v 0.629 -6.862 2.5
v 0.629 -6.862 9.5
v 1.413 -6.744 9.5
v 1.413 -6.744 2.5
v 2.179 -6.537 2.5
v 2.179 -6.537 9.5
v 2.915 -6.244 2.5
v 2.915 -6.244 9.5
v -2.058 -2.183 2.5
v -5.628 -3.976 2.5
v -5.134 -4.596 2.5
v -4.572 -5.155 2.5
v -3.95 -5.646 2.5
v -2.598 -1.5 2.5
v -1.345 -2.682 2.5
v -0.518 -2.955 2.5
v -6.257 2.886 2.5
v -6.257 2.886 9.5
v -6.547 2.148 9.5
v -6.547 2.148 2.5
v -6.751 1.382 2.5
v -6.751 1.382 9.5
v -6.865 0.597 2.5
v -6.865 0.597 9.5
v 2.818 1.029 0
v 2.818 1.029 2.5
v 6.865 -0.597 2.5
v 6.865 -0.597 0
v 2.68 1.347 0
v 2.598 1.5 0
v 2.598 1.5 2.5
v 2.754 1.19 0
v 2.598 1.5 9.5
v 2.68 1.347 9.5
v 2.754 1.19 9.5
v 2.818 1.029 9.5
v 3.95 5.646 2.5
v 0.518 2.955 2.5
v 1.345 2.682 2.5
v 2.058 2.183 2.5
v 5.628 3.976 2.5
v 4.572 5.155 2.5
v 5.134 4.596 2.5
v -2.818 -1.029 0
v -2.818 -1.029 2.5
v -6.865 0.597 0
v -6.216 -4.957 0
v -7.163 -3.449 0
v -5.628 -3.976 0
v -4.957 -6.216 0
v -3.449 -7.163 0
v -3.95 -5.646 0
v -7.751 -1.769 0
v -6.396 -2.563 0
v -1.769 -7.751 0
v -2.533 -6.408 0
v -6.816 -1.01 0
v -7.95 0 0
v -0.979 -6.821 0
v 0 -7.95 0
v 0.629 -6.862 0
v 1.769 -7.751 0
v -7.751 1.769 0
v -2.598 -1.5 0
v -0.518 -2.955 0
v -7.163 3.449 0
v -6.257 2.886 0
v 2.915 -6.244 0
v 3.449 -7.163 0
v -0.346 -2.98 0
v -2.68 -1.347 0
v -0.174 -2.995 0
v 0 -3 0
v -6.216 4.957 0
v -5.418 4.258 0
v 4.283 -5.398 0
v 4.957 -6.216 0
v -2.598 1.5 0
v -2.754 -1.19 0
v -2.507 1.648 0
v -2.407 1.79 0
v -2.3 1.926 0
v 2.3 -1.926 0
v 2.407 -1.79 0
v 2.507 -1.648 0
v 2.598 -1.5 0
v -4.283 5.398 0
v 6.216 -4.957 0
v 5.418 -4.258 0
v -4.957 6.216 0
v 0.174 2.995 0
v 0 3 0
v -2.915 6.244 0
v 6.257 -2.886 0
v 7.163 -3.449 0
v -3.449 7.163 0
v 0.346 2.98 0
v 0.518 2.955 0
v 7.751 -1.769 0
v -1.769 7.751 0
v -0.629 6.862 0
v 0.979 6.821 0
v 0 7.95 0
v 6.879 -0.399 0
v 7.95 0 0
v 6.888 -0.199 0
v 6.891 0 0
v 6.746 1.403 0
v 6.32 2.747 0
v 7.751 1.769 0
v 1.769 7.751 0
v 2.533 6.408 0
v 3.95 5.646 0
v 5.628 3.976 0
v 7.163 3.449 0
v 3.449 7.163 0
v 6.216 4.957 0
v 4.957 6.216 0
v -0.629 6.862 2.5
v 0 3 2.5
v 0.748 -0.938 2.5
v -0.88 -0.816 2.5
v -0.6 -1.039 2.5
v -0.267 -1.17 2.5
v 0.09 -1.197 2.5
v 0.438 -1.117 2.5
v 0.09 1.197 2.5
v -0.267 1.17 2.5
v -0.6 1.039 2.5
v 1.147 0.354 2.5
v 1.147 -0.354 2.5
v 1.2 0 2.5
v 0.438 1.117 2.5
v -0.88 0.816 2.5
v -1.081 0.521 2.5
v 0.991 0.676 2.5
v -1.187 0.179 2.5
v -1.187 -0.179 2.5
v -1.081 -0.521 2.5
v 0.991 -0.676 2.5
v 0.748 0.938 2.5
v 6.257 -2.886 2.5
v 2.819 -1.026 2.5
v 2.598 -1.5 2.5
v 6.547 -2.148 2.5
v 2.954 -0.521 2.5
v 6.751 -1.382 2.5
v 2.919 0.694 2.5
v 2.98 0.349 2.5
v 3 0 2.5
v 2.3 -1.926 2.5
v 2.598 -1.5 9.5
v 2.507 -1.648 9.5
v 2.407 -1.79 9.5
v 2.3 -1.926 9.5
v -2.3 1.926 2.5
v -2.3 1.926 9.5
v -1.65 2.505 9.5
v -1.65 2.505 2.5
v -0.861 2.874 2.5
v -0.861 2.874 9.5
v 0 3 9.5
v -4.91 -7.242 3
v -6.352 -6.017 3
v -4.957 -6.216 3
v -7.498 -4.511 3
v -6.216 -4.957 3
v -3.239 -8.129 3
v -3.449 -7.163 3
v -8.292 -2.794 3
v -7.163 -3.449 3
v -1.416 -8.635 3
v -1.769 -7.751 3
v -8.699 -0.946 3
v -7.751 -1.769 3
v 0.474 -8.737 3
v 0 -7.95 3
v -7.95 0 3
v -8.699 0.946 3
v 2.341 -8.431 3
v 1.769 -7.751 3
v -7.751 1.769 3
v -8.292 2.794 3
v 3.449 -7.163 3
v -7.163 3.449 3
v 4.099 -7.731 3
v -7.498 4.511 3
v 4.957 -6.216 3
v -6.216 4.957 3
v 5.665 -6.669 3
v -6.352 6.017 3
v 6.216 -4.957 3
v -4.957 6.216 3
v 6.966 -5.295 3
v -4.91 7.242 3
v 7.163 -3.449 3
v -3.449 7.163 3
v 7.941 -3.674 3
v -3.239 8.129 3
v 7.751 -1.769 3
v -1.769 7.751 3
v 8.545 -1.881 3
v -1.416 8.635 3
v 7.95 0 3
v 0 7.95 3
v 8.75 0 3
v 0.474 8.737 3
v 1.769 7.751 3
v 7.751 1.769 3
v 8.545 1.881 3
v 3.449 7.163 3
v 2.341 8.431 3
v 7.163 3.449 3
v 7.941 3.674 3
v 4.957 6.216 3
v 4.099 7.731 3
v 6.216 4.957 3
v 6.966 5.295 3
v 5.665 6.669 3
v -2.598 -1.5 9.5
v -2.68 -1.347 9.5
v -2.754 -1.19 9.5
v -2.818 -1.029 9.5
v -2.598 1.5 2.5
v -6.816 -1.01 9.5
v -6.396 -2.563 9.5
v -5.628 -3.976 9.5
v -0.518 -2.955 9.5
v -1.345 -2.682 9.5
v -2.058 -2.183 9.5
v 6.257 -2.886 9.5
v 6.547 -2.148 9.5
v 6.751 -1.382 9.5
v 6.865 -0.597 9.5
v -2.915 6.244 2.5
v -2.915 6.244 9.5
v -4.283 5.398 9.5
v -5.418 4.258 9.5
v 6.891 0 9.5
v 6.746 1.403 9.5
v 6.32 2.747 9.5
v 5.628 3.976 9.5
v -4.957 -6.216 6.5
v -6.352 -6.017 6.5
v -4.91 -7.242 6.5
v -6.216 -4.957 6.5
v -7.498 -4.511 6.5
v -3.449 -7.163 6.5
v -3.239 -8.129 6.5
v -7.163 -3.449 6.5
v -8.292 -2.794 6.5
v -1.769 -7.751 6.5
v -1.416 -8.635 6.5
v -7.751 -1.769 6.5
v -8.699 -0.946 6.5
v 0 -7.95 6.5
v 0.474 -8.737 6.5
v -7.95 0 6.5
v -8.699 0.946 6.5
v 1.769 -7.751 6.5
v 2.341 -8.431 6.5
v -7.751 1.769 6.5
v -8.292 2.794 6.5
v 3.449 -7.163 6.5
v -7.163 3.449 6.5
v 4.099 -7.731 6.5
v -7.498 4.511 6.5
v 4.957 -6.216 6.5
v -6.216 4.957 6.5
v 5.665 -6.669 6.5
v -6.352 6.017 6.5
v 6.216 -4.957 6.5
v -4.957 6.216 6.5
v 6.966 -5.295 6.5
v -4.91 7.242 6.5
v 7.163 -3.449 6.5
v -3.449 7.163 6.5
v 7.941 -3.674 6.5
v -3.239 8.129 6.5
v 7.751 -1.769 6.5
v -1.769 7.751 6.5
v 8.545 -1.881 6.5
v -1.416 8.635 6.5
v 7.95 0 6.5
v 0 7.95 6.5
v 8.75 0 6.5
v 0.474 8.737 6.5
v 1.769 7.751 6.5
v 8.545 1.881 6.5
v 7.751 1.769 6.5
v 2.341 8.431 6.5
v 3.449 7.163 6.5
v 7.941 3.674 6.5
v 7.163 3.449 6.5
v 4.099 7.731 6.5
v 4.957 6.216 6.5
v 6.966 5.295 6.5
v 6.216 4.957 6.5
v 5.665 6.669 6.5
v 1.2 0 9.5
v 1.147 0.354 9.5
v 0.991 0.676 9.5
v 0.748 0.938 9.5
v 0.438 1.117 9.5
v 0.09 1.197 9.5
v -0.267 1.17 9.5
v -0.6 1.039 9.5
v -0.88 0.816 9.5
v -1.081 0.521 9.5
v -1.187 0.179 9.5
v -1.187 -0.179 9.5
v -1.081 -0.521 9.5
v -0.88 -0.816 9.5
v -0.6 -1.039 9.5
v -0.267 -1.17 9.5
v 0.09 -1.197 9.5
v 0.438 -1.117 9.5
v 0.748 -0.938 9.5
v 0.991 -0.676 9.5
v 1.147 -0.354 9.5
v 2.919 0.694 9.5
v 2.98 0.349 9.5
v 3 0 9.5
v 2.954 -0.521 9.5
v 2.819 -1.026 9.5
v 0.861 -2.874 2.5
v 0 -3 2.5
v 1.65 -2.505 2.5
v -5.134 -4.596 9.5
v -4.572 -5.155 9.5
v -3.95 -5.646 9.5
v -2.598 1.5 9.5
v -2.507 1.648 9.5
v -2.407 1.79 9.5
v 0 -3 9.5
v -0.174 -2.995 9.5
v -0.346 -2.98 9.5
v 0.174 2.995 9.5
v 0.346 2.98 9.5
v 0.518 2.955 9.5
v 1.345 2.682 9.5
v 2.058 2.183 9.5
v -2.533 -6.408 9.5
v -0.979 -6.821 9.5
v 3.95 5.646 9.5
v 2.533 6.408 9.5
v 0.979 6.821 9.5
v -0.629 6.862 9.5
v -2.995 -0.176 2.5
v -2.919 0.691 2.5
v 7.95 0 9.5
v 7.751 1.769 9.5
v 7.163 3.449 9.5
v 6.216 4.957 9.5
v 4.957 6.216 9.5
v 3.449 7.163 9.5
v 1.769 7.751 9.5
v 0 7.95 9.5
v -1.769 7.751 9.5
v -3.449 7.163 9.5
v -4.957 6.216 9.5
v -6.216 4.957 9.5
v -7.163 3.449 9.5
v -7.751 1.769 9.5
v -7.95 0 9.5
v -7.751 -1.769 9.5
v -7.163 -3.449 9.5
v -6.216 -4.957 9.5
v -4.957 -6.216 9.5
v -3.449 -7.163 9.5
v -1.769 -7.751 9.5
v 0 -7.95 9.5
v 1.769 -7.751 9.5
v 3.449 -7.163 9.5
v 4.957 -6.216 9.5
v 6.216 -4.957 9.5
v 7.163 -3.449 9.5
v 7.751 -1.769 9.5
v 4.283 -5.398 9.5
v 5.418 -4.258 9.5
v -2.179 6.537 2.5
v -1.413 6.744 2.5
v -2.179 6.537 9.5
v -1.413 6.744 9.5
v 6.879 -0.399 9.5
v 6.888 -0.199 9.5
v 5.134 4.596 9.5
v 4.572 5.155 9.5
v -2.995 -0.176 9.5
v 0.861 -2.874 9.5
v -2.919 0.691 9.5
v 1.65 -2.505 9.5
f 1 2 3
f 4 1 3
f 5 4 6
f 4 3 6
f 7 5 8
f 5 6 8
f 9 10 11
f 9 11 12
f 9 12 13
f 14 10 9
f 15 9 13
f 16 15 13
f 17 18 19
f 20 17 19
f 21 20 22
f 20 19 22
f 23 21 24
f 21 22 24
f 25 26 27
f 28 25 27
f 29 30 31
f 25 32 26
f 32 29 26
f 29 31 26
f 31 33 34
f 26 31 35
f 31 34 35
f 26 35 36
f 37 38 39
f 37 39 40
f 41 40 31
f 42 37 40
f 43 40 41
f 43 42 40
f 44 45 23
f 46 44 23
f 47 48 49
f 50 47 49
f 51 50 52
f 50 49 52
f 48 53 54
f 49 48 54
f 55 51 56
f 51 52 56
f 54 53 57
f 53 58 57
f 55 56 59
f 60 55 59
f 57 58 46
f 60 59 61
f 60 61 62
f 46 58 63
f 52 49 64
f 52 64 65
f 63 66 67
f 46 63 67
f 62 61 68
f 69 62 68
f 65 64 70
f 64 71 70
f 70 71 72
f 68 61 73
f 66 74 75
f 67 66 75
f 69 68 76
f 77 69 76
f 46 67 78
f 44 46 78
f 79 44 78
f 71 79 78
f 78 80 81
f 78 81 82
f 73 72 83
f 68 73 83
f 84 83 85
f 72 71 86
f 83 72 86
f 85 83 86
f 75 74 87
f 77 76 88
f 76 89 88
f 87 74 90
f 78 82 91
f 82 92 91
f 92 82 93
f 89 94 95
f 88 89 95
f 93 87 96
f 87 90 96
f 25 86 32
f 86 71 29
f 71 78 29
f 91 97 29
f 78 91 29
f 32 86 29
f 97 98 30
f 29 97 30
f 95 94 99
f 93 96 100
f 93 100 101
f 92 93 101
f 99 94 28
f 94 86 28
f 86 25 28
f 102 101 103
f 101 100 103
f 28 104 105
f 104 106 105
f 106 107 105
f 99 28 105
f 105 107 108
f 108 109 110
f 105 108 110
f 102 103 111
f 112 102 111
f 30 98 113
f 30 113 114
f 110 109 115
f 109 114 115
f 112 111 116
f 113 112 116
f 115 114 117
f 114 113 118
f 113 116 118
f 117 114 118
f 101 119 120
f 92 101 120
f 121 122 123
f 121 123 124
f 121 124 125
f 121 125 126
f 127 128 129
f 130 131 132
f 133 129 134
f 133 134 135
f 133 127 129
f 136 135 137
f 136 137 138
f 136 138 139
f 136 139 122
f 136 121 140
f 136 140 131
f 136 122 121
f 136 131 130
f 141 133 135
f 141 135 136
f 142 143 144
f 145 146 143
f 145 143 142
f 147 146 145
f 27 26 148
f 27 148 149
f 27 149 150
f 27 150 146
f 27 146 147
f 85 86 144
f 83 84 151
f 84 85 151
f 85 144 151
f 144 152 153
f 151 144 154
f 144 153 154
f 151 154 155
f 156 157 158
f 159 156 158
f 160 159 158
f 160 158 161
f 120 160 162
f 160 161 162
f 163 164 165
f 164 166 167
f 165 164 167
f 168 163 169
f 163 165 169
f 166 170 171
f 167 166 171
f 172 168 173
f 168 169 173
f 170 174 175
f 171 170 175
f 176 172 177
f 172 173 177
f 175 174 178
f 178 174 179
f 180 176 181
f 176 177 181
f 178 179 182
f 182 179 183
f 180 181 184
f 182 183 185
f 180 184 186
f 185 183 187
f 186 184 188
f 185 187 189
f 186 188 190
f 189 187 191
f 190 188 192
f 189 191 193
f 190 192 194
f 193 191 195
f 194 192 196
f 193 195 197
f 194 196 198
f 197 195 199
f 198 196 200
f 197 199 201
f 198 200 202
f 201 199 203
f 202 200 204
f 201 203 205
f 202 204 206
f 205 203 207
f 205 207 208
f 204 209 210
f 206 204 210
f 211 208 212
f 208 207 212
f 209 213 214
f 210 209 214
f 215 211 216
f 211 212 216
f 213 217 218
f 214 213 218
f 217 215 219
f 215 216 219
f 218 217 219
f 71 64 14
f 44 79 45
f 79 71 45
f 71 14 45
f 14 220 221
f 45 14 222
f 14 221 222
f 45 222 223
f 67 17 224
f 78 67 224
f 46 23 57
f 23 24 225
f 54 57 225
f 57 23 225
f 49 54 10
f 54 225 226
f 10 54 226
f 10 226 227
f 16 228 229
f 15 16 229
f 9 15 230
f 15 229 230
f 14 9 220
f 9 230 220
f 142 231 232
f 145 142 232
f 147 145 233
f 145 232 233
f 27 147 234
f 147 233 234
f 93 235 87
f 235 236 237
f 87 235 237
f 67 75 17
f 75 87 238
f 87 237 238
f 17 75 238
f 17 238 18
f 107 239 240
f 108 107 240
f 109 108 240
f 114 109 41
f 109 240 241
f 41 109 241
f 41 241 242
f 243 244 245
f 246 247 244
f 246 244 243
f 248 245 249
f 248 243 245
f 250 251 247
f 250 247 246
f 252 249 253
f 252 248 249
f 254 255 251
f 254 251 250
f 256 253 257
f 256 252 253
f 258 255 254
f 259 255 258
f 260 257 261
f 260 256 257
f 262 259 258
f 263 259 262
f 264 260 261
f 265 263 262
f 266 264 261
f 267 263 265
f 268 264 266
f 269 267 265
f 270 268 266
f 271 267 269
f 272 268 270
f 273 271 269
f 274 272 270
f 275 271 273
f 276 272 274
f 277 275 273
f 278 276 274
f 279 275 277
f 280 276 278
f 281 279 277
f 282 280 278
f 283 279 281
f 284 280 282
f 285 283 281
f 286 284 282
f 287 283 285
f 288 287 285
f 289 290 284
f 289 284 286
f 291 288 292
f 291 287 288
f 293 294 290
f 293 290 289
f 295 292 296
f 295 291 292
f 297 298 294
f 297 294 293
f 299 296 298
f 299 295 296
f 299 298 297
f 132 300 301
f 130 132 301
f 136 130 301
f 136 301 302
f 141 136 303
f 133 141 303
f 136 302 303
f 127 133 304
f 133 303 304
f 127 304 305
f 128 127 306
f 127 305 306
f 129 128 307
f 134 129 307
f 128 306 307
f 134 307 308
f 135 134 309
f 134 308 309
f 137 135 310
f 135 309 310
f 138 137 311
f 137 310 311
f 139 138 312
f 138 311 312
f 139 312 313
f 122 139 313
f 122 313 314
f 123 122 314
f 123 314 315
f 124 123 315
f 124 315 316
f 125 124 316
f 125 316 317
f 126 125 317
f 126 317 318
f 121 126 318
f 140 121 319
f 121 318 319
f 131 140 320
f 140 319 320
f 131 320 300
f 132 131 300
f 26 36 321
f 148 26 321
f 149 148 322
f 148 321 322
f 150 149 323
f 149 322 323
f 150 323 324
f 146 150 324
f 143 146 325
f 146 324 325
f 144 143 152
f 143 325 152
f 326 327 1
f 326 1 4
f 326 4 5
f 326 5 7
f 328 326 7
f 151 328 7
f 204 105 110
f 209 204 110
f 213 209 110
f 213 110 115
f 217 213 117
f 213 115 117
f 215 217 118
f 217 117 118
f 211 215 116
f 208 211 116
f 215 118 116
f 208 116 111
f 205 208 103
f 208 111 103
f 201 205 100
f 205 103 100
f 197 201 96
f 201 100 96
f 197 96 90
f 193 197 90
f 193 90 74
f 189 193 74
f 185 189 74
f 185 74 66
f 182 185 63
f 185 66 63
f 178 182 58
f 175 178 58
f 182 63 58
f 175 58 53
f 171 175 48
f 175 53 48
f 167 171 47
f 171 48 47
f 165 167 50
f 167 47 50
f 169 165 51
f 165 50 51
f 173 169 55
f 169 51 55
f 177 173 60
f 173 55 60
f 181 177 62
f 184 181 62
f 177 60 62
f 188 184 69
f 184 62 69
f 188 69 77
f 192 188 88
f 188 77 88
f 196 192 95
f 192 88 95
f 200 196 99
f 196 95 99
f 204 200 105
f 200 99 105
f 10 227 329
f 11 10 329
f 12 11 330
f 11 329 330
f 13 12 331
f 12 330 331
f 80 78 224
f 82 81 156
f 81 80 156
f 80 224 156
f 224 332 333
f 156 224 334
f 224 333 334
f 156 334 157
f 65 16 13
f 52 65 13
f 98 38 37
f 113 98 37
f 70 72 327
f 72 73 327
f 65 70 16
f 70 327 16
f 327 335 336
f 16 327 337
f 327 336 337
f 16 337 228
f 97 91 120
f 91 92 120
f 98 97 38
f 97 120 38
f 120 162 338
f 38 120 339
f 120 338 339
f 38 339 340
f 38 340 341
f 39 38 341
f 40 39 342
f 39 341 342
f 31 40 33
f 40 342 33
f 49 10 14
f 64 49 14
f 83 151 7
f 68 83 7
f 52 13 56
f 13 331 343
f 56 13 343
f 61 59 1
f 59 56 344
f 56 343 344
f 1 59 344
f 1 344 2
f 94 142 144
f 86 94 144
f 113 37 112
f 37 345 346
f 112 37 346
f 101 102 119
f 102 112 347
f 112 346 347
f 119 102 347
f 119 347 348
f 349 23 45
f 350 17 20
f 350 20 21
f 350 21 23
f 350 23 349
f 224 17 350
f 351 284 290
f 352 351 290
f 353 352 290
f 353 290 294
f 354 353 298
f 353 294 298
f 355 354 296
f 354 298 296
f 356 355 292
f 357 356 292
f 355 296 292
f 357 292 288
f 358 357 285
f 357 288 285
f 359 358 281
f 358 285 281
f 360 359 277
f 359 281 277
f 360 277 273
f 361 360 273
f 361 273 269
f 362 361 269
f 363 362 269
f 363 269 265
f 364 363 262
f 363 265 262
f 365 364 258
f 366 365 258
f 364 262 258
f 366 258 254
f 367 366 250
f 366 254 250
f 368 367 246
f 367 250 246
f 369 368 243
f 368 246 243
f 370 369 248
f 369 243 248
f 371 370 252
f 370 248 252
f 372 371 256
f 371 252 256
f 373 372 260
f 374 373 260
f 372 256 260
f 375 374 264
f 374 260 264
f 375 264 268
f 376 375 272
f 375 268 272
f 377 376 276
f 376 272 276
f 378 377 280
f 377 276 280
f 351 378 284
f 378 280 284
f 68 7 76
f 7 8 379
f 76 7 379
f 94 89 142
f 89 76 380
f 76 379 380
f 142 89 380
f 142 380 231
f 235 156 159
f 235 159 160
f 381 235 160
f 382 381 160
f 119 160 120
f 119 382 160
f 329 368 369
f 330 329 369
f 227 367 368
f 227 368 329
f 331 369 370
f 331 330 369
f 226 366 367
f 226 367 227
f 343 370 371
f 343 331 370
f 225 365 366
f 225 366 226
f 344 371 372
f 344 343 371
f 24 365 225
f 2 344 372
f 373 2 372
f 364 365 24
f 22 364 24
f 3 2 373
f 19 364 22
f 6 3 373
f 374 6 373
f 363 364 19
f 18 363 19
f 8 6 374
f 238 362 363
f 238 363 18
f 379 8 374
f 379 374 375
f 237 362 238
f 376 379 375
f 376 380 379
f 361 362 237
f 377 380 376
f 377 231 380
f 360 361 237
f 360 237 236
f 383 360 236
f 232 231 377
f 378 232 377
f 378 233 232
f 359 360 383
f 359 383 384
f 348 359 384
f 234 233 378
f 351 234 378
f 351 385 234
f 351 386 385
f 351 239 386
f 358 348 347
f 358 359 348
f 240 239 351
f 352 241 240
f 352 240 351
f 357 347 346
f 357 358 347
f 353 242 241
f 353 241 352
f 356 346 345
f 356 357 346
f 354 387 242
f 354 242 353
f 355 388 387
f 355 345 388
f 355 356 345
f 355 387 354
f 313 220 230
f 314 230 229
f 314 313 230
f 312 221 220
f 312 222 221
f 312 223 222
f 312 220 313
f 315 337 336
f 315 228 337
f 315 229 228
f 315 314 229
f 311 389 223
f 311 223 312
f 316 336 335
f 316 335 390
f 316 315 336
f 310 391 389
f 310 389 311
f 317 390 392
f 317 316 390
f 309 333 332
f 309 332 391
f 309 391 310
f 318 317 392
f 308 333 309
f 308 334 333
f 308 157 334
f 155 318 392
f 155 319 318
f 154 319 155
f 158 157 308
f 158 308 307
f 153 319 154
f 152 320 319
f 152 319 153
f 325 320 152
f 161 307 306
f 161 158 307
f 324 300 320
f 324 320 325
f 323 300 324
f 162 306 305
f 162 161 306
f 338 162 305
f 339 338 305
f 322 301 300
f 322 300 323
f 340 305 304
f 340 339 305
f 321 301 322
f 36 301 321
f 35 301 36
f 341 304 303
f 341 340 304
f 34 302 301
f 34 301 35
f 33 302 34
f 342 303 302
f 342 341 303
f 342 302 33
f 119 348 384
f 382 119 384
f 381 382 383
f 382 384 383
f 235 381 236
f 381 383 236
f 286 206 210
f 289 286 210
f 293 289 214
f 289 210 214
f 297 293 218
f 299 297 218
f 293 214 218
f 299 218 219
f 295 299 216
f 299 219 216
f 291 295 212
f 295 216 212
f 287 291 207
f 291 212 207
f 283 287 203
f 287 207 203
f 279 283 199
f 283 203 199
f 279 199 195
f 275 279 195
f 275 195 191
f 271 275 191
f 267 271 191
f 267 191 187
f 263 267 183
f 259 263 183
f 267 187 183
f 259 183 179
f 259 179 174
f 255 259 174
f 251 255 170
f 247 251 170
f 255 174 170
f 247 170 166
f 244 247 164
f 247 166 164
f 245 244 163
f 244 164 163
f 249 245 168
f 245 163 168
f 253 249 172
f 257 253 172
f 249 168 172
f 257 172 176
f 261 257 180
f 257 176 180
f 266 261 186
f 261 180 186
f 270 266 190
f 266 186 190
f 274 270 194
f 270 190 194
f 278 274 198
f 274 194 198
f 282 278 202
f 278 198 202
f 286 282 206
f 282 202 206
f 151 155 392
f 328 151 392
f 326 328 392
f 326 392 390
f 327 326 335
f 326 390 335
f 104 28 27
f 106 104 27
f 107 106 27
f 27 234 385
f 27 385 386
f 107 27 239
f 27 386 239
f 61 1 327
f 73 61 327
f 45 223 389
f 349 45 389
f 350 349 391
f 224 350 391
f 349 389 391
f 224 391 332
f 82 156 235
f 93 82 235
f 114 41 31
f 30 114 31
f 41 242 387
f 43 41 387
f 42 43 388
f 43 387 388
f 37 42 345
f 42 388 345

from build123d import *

# Parameters (mm, degrees)
F0_R     = 7.95
F1_DEPTH = 3
F2_R     = 8.75
F3_DEPTH = 3.5
F4_R     = 7.95
F5_DEPTH = 3
F7_DEPTH = 25
F6_R     = 1.2
F8_DEPTH = 7


with BuildPart() as f1:
    # F0 (on Top) → F1 (new body)
    with BuildSketch(Plane.XY):
        Circle(F0_R)
    extrude(amount=F1_DEPTH)

    # F2 (on face) → F3 (join)
    with BuildSketch(Plane.XY.offset(3)):
        Circle(F2_R)
    extrude(amount=F3_DEPTH)

    # F4 (on face) → F5 (join)
    with BuildSketch(Plane.XY.offset(6.5)):
        Circle(F4_R)
    extrude(amount=F5_DEPTH)

    # F6 (on face) → F7 (cut)
    with BuildSketch(Plane.XY.offset(9.5)):
        with BuildLine():
            ThreePointArc((-2.598076, 1.5), (-2.458255, 1.719588), (-2.299923, 1.926228))
            Line((-2.299923, 1.926228), (-2.915072, 6.243758))
            ThreePointArc((-2.915072, 6.243758), (-4.883769, 4.86117), (-6.257211, 2.886082))
            Line((-6.257211, 2.886082), (-2.598076, 1.5))
        make_face()
        with BuildLine():
            ThreePointArc((0, 3), (0.26008, 2.988705), (0.518201, 2.954906))
            Line((0.518201, 2.954906), (3.949717, 5.646406))
            ThreePointArc((3.949717, 5.646406), (1.768012, 6.660052), (-0.629185, 6.861945))
            Line((-0.629185, 6.861945), (0, 3))
        make_face()
        with BuildLine():
            ThreePointArc((2.598076, 1.5), (2.718334, 1.269117), (2.818124, 1.028678))
            Line((2.818124, 1.028678), (6.864789, -0.597352))
            ThreePointArc((6.864789, -0.597352), (6.884242, -0.298958), (6.89073, 0))
            ThreePointArc((6.89073, 0), (6.567472, 2.08578), (5.628026, 3.975863))
            Line((5.628026, 3.975863), (2.598076, 1.5))
        make_face()
        with BuildLine():
            Line((6.257211, -2.886082), (2.598076, -1.5))
            ThreePointArc((2.598076, -1.5), (2.458255, -1.719588), (2.299923, -1.926228))
            Line((2.299923, -1.926228), (2.915072, -6.243758))
            ThreePointArc((2.915072, -6.243758), (4.883769, -4.86117), (6.257211, -2.886082))
        make_face()
        with BuildLine():
            Line((0.629185, -6.861945), (0, -3))
            ThreePointArc((0, -3), (-0.26008, -2.988705), (-0.518201, -2.954906))
            Line((-0.518201, -2.954906), (-3.949717, -5.646406))
            ThreePointArc((-3.949717, -5.646406), (-1.768012, -6.660052), (0.629185, -6.861945))
        make_face()
        with BuildLine():
            Line((-5.628026, -3.975863), (-2.598076, -1.5))
            ThreePointArc((-2.598076, -1.5), (-2.718334, -1.269117), (-2.818124, -1.028678))
            Line((-2.818124, -1.028678), (-6.864789, 0.597352))
            ThreePointArc((-6.864789, 0.597352), (-6.651781, -1.798883), (-5.628026, -3.975863))
        make_face()
    extrude(amount=-F7_DEPTH, mode=Mode.SUBTRACT)

    # F6 (on face) → F8 (cut)
    with BuildSketch(Plane.XY.offset(9.5)):
        Circle(F6_R)
        with BuildLine():
            ThreePointArc((-2.818124, -1.028678), (-2.988705, 0.26008), (-2.598076, 1.5))
            Line((-2.598076, 1.5), (-6.257211, 2.886082))
            ThreePointArc((-6.257211, 2.886082), (-6.660052, 1.768012), (-6.864789, 0.597352))
            Line((-6.864789, 0.597352), (-2.818124, -1.028678))
        make_face()
        with BuildLine():
            ThreePointArc((-2.299923, 1.926228), (-1.269117, 2.718334), (0, 3))
            Line((0, 3), (-0.629185, 6.861945))
            ThreePointArc((-0.629185, 6.861945), (-1.798883, 6.651781), (-2.915072, 6.243758))
            Line((-2.915072, 6.243758), (-2.299923, 1.926228))
        make_face()
        with BuildLine():
            ThreePointArc((0.518201, 2.954906), (1.719588, 2.458255), (2.598076, 1.5))
            Line((2.598076, 1.5), (5.628026, 3.975863))
            ThreePointArc((5.628026, 3.975863), (4.86117, 4.883769), (3.949717, 5.646406))
            Line((3.949717, 5.646406), (0.518201, 2.954906))
        make_face()
        with BuildLine():
            ThreePointArc((2.818124, 1.028678), (2.954181, 0.522316), (3, 0))
            ThreePointArc((3, 0), (2.897777, -0.776457), (2.598076, -1.5))
            Line((2.598076, -1.5), (6.257211, -2.886082))
            ThreePointArc((6.257211, -2.886082), (6.660052, -1.768012), (6.864789, -0.597352))
            Line((6.864789, -0.597352), (2.818124, 1.028678))
        make_face()
        with BuildLine():
            Line((2.915072, -6.243758), (2.299923, -1.926228))
            ThreePointArc((2.299923, -1.926228), (1.269117, -2.718334), (0, -3))
            Line((0, -3), (0.629185, -6.861945))
            ThreePointArc((0.629185, -6.861945), (1.798883, -6.651781), (2.915072, -6.243758))
        make_face()
        with BuildLine():
            Line((-3.949717, -5.646406), (-0.518201, -2.954906))
            ThreePointArc((-0.518201, -2.954906), (-1.719588, -2.458255), (-2.598076, -1.5))
            Line((-2.598076, -1.5), (-5.628026, -3.975863))
            ThreePointArc((-5.628026, -3.975863), (-4.86117, -4.883769), (-3.949717, -5.646406))
        make_face()
    extrude(amount=-F8_DEPTH, mode=Mode.SUBTRACT)


solid = f1.part
